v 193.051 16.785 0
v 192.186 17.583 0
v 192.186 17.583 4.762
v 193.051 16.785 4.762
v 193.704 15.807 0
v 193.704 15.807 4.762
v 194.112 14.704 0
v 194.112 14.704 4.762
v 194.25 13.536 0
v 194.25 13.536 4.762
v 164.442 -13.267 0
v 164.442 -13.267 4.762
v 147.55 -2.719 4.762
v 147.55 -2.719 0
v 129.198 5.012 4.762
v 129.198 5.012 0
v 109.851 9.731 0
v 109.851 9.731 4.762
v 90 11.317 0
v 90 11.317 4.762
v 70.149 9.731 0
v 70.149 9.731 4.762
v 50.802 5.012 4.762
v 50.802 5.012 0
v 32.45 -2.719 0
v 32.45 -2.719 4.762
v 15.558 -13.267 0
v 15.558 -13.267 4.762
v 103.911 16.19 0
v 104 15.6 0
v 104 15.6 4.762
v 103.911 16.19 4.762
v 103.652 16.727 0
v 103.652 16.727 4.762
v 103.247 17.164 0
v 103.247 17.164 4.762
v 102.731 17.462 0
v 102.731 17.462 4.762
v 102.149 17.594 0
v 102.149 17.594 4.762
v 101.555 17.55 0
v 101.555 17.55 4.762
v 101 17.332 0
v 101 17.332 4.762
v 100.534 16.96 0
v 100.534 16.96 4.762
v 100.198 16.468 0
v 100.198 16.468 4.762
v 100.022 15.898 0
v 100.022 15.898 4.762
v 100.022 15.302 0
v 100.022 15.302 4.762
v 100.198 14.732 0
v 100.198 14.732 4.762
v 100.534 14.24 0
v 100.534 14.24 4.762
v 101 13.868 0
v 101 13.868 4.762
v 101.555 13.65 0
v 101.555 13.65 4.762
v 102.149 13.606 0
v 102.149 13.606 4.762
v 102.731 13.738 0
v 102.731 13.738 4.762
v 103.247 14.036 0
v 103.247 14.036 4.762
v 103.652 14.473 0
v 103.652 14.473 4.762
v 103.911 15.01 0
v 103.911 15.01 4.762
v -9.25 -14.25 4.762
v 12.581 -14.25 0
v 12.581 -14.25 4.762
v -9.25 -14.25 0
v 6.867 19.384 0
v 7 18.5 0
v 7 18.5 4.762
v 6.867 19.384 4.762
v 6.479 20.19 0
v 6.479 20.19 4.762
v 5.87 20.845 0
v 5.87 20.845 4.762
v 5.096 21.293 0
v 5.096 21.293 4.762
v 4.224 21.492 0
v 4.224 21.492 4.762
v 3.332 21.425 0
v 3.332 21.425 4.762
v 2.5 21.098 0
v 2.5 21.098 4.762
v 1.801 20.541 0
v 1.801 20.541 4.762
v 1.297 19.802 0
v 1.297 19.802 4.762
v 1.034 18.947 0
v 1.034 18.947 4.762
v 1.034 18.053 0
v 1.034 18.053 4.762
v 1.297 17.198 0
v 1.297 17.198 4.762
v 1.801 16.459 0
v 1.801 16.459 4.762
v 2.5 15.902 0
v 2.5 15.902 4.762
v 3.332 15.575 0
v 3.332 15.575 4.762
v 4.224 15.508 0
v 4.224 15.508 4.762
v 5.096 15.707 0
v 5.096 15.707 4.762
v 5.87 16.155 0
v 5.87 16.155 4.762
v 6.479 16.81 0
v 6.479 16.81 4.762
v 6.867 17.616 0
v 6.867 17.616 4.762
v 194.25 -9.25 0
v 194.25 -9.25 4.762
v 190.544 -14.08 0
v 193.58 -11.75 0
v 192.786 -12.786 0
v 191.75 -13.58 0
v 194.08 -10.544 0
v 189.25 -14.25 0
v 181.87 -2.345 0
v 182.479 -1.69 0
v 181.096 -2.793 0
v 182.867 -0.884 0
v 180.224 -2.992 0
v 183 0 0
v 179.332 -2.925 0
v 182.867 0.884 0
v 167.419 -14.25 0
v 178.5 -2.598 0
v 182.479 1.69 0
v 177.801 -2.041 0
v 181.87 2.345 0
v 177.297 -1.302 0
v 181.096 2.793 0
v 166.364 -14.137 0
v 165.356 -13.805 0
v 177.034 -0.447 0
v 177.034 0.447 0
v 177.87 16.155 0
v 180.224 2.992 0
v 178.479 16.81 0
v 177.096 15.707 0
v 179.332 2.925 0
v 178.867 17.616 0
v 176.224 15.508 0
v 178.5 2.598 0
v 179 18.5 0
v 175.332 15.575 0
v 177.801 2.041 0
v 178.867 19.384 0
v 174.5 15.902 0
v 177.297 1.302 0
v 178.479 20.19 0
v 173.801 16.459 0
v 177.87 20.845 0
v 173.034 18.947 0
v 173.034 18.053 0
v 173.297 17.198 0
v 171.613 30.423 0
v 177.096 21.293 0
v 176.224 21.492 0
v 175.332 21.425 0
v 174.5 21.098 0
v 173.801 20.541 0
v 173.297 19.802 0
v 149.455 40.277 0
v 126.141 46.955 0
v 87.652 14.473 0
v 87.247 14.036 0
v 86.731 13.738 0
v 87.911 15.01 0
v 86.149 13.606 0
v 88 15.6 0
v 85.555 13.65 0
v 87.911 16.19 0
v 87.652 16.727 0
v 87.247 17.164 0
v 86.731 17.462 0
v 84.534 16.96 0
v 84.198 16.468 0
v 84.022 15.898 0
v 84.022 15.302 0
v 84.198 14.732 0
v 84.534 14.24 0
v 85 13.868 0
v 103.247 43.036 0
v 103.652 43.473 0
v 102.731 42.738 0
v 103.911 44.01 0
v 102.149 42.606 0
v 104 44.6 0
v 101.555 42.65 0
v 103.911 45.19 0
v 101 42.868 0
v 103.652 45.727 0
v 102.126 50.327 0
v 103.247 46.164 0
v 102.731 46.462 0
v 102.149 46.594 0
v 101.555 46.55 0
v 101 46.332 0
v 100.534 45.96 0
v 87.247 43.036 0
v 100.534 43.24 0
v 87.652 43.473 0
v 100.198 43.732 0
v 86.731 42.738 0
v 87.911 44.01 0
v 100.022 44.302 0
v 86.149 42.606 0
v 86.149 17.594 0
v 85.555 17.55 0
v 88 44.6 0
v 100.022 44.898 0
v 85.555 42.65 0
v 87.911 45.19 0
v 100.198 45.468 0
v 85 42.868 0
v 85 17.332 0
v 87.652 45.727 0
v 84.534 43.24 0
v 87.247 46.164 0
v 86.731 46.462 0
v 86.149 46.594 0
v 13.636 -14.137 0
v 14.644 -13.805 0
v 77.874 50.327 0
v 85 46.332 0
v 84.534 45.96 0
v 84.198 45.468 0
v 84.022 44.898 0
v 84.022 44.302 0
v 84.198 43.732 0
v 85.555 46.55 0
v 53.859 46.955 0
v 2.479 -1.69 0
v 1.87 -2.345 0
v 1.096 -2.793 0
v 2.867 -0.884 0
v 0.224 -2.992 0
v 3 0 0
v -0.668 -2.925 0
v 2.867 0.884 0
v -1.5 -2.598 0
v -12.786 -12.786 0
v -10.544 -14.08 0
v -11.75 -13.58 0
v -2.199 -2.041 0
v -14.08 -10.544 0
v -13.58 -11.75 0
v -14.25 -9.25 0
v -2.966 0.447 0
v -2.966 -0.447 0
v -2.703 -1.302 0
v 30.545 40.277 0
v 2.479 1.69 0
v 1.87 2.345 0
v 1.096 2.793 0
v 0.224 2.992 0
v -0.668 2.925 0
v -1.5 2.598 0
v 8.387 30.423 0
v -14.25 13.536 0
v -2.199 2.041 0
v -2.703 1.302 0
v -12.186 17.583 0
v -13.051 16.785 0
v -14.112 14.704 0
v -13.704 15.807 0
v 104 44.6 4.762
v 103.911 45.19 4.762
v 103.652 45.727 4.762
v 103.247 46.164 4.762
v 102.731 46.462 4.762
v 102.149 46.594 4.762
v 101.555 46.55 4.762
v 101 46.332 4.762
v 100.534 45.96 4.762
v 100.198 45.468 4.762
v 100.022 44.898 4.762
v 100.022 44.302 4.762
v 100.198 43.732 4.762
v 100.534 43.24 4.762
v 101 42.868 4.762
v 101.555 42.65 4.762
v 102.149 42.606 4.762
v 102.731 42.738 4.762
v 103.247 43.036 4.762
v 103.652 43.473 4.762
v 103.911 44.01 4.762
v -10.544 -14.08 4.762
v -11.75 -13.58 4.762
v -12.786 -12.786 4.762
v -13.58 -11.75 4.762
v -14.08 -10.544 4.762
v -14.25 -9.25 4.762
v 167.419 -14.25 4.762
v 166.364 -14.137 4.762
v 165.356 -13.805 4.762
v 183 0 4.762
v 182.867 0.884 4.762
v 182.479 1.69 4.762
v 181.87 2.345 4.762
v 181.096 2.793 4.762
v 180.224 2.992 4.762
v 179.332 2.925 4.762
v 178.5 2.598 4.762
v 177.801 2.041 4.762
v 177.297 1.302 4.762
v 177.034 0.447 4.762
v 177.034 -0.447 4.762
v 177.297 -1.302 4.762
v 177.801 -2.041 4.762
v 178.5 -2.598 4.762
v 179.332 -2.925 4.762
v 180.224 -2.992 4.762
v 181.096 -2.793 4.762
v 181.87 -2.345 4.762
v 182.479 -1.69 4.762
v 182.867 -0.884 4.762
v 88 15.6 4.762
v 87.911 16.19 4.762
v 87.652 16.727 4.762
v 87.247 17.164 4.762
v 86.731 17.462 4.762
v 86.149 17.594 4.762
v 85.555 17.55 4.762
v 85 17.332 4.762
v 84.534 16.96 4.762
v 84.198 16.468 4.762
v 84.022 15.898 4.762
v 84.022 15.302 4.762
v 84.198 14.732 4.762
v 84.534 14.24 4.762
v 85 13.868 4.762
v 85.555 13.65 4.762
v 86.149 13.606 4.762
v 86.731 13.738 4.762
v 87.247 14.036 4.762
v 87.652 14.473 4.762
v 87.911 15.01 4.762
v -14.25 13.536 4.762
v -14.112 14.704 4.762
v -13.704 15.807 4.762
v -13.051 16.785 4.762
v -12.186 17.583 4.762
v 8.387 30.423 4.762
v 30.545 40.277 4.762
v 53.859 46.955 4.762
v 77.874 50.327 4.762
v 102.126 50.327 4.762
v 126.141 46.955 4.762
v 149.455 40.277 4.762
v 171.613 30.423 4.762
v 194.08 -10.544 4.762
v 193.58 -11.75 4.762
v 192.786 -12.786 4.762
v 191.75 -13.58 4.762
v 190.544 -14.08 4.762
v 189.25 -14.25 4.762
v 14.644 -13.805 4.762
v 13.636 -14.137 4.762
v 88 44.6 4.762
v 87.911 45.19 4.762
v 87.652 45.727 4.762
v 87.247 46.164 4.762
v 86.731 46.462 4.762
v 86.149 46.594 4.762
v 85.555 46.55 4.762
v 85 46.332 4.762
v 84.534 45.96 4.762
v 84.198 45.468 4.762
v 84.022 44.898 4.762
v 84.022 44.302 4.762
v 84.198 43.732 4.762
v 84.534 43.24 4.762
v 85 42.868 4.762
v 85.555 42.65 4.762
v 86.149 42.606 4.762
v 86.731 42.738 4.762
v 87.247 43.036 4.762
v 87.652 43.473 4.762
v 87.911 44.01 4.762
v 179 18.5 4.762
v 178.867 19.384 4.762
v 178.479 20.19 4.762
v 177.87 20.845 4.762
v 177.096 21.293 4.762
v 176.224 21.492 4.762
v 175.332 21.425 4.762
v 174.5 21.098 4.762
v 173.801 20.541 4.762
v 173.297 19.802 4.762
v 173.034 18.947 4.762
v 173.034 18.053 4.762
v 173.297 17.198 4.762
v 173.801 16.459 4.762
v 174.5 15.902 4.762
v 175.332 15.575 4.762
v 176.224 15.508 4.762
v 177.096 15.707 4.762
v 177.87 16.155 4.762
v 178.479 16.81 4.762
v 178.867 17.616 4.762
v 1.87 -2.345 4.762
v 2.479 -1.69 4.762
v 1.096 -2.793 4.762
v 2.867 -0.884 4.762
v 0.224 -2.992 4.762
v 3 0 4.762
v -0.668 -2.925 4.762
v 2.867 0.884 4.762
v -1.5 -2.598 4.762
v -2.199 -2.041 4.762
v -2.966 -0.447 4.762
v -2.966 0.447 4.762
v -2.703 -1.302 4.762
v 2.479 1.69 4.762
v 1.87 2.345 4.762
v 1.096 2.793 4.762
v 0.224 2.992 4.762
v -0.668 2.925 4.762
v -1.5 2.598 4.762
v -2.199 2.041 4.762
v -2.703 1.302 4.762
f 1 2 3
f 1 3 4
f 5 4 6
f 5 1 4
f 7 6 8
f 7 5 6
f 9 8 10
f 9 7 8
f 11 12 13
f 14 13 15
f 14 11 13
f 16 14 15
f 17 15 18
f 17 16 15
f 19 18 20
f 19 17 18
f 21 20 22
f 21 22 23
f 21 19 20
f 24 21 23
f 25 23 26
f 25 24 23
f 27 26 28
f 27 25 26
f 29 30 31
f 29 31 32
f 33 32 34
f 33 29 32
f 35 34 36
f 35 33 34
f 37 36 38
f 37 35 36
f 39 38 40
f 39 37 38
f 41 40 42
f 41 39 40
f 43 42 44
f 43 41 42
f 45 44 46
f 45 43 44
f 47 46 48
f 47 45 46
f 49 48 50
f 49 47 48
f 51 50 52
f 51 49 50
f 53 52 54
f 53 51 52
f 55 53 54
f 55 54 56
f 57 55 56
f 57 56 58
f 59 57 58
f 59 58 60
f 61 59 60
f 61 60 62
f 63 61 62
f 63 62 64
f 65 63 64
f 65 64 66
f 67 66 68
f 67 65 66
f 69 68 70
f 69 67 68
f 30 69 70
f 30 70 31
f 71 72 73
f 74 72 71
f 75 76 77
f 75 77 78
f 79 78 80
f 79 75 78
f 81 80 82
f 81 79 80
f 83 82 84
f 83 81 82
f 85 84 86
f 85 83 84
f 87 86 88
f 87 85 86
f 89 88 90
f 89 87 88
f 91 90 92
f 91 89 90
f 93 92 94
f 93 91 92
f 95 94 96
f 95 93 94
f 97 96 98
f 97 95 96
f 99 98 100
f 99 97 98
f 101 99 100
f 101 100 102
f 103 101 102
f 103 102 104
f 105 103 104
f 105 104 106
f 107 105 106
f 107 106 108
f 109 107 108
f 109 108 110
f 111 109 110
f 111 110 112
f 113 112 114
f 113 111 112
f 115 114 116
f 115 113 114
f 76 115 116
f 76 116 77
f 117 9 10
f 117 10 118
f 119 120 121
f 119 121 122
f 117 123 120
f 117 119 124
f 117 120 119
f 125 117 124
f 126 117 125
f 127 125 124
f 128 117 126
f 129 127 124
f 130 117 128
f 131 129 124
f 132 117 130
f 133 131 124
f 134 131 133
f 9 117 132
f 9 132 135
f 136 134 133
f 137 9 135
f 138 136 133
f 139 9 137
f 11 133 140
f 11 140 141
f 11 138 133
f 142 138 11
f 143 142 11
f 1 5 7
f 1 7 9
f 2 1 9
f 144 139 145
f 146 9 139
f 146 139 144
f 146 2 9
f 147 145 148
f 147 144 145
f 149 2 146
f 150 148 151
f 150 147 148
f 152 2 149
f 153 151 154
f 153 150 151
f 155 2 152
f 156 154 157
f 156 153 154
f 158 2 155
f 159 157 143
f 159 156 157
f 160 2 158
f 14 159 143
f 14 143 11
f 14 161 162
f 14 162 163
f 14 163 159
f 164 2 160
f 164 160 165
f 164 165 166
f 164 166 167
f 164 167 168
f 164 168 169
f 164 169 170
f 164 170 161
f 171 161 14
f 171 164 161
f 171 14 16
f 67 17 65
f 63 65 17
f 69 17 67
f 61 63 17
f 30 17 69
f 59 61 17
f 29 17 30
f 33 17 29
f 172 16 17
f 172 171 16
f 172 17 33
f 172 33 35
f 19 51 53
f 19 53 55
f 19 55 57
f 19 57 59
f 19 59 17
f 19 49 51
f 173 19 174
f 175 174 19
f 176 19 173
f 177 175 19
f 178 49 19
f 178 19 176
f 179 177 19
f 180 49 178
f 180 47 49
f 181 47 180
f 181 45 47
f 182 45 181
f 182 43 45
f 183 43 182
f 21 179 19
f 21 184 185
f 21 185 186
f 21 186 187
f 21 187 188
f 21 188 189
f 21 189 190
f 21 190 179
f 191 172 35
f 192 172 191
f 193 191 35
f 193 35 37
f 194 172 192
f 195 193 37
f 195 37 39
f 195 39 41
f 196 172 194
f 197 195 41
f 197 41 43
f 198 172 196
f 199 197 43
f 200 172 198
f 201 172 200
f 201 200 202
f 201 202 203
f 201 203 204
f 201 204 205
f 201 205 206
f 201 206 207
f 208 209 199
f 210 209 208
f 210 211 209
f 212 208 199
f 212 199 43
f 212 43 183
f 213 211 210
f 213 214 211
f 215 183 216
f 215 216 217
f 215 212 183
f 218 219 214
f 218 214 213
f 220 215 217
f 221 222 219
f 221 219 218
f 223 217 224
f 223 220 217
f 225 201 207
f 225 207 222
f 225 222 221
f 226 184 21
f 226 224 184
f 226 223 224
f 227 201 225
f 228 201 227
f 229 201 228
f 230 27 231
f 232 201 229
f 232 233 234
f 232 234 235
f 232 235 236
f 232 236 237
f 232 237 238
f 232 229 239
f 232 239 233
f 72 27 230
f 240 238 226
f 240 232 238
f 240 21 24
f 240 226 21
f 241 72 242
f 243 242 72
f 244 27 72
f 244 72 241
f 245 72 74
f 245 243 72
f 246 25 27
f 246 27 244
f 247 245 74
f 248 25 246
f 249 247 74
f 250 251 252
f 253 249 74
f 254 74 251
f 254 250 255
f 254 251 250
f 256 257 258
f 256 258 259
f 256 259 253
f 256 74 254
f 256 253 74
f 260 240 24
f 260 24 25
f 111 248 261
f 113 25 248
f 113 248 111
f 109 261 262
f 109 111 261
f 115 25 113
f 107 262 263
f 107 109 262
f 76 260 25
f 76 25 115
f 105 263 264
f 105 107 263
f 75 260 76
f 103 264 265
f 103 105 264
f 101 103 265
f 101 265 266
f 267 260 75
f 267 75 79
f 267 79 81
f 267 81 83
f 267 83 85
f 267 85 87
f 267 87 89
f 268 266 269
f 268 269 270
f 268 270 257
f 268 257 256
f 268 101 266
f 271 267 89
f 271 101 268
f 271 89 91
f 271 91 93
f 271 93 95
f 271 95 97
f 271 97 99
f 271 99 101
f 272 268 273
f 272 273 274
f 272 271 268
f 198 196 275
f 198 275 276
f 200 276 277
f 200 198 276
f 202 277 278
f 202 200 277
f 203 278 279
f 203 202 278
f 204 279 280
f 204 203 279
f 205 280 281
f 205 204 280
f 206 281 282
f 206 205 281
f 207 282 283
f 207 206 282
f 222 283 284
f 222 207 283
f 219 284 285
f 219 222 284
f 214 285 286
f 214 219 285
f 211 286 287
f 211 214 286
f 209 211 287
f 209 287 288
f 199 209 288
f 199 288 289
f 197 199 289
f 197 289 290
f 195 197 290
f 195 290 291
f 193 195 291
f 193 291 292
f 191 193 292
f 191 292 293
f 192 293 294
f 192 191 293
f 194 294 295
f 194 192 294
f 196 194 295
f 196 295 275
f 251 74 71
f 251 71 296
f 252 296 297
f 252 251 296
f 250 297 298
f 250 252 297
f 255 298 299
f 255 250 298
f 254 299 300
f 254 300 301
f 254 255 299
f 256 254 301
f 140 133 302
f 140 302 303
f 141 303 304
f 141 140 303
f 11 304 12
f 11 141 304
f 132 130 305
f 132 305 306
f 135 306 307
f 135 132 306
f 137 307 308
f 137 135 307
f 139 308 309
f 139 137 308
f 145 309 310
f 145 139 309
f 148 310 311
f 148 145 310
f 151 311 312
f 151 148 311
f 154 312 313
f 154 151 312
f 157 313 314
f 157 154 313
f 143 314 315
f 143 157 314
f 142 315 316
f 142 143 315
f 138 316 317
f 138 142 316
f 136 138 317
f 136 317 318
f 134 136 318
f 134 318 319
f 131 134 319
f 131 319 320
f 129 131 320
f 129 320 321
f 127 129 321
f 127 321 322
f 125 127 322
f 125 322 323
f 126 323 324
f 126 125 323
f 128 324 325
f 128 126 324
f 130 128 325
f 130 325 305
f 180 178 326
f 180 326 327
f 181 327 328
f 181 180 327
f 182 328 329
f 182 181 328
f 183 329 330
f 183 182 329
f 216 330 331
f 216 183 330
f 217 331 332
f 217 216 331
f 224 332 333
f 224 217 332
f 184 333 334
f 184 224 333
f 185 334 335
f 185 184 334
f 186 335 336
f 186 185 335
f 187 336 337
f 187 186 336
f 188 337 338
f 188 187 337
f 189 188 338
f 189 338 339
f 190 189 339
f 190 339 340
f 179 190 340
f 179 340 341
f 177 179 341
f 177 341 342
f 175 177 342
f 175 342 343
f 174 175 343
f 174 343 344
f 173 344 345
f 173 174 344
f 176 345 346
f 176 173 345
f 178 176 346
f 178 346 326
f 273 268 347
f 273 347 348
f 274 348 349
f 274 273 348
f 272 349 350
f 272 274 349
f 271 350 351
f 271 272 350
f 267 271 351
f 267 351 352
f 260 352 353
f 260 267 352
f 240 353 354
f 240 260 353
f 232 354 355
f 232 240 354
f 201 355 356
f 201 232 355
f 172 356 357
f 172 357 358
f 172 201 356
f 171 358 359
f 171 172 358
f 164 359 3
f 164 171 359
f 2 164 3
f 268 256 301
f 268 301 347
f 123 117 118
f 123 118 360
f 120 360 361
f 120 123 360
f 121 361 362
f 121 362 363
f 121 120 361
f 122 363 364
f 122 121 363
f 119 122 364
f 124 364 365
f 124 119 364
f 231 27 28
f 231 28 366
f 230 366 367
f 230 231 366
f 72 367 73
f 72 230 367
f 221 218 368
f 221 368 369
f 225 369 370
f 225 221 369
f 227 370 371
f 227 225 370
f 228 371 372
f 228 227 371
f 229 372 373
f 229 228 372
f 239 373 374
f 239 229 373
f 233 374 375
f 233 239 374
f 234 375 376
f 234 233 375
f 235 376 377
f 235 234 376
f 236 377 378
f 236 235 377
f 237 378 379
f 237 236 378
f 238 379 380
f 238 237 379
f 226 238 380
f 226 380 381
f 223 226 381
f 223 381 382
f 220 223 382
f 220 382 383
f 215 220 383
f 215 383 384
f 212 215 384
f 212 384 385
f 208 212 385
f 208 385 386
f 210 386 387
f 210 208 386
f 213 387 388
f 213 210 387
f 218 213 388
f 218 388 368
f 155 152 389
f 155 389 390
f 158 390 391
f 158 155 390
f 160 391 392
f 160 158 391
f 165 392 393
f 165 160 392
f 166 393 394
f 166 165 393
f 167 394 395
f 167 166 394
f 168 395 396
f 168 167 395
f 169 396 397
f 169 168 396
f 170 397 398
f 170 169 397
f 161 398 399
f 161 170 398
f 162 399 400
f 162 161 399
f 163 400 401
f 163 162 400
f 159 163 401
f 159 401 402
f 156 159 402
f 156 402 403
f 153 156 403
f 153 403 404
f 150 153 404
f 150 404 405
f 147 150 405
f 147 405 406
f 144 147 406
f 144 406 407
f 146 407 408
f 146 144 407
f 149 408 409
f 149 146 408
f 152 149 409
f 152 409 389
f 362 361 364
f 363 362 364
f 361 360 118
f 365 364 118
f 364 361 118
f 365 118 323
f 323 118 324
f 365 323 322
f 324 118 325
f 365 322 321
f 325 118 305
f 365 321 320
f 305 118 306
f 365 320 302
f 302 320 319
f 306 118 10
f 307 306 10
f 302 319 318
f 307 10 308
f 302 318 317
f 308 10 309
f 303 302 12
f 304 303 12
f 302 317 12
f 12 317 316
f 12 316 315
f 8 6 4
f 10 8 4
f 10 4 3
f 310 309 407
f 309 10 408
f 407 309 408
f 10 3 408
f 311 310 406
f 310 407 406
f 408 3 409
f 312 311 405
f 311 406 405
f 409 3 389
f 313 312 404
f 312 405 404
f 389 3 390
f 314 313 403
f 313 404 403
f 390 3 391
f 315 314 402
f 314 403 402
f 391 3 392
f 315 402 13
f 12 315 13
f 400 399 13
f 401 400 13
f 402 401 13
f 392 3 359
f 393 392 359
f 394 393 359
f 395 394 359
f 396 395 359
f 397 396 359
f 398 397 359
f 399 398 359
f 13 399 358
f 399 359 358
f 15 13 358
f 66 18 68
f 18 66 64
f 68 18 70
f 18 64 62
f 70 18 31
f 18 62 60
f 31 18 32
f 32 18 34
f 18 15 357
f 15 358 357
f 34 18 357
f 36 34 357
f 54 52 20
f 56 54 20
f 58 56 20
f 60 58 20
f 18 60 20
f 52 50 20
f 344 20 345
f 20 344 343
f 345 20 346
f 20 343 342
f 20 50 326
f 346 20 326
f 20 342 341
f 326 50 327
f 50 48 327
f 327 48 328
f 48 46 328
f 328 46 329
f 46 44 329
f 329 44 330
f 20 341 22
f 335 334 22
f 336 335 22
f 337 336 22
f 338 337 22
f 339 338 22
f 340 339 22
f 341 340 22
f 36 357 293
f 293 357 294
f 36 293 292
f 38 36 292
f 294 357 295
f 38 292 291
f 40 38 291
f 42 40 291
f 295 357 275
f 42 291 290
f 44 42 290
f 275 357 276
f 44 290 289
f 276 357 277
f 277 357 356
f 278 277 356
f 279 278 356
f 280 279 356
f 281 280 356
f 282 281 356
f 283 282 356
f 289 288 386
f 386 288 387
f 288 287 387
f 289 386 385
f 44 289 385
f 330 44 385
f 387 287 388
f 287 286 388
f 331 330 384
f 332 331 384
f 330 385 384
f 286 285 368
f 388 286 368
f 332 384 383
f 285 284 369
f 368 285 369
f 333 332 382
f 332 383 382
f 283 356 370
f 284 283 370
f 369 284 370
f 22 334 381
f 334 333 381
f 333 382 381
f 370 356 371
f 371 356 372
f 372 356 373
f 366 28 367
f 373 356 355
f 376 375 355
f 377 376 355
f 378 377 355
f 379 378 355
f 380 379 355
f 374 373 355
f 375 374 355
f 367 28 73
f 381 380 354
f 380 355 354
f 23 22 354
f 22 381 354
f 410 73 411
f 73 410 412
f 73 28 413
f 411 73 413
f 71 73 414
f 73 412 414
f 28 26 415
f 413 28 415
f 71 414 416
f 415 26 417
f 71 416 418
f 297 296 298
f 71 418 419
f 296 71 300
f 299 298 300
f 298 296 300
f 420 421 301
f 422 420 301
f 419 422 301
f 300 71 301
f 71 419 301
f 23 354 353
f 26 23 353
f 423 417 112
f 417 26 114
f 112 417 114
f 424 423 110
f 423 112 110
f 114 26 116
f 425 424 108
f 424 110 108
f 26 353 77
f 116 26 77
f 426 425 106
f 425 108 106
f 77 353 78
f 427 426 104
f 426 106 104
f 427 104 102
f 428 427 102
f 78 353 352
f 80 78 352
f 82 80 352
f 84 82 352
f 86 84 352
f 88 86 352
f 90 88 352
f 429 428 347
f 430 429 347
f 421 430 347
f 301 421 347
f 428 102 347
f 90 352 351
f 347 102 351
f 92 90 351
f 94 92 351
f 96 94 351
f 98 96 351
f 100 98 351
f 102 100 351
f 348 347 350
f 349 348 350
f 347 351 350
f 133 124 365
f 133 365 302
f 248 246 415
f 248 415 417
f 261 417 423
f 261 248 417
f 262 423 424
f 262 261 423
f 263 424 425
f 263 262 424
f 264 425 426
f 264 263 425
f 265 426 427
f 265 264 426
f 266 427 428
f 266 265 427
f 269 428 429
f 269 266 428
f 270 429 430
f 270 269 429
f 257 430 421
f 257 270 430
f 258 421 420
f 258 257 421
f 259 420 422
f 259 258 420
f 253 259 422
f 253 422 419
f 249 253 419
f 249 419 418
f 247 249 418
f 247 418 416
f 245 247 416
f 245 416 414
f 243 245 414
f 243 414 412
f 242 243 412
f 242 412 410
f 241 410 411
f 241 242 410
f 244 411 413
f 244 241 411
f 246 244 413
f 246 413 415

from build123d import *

# Parameters (mm, degrees)
SKETCH1_R           = 2
SKETCH1_R_2         = 3
BOSS_EXTRUDE1_DEPTH = 4.7625


with BuildPart() as part:
    # Sketch1 → Boss-Extrude1 (new body)
    with BuildSketch(Plane.XY):
        with BuildLine():
            Line((-14.25, -9.25), (-14.25, 13.536101268))
            ThreePointArc((-14.25, 13.536101268), (-13.704321085, 15.807449693), (-12.186390533, 17.583027341))
            ThreePointArc((-12.186390533, 17.583027341), (90, 50.75), (192.186390533, 17.583027341))
            ThreePointArc((192.186390533, 17.583027341), (193.704321085, 15.807449693), (194.25, 13.536101268))
            Line((194.25, 13.536101268), (194.25, -9.25))
            ThreePointArc((194.25, -9.25), (192.785533906, -12.785533906), (189.25, -14.25))
            Line((189.25, -14.25), (167.419194615, -14.25))
            ThreePointArc((167.419194615, -14.25), (165.851279553, -13.997803951), (164.441533284, -13.266656943))
            ThreePointArc((164.441533284, -13.266656943), (90, 11.316919489), (15.558466716, -13.266656943))
            ThreePointArc((15.558466716, -13.266656943), (14.148720447, -13.997803951), (12.580805385, -14.25))
            Line((12.580805385, -14.25), (-9.25, -14.25))
            ThreePointArc((-9.25, -14.25), (-12.785533906, -12.785533906), (-14.25, -9.25))
        make_face()
        with Locations((86, 44.6)):
            Circle(SKETCH1_R, mode=Mode.SUBTRACT)
        with Locations((86, 15.6)):
            Circle(SKETCH1_R, mode=Mode.SUBTRACT)
        with Locations((102, 44.6)):
            Circle(SKETCH1_R, mode=Mode.SUBTRACT)
        with Locations((102, 15.6)):
            Circle(SKETCH1_R, mode=Mode.SUBTRACT)
        with Locations((180, 0)):
            Circle(SKETCH1_R_2, mode=Mode.SUBTRACT)
        Circle(SKETCH1_R_2, mode=Mode.SUBTRACT)
        with Locations((4, 18.5)):
            Circle(SKETCH1_R_2, mode=Mode.SUBTRACT)
        with Locations((176, 18.5)):
            Circle(SKETCH1_R_2, mode=Mode.SUBTRACT)
    extrude(amount=BOSS_EXTRUDE1_DEPTH)


solid = part.part
